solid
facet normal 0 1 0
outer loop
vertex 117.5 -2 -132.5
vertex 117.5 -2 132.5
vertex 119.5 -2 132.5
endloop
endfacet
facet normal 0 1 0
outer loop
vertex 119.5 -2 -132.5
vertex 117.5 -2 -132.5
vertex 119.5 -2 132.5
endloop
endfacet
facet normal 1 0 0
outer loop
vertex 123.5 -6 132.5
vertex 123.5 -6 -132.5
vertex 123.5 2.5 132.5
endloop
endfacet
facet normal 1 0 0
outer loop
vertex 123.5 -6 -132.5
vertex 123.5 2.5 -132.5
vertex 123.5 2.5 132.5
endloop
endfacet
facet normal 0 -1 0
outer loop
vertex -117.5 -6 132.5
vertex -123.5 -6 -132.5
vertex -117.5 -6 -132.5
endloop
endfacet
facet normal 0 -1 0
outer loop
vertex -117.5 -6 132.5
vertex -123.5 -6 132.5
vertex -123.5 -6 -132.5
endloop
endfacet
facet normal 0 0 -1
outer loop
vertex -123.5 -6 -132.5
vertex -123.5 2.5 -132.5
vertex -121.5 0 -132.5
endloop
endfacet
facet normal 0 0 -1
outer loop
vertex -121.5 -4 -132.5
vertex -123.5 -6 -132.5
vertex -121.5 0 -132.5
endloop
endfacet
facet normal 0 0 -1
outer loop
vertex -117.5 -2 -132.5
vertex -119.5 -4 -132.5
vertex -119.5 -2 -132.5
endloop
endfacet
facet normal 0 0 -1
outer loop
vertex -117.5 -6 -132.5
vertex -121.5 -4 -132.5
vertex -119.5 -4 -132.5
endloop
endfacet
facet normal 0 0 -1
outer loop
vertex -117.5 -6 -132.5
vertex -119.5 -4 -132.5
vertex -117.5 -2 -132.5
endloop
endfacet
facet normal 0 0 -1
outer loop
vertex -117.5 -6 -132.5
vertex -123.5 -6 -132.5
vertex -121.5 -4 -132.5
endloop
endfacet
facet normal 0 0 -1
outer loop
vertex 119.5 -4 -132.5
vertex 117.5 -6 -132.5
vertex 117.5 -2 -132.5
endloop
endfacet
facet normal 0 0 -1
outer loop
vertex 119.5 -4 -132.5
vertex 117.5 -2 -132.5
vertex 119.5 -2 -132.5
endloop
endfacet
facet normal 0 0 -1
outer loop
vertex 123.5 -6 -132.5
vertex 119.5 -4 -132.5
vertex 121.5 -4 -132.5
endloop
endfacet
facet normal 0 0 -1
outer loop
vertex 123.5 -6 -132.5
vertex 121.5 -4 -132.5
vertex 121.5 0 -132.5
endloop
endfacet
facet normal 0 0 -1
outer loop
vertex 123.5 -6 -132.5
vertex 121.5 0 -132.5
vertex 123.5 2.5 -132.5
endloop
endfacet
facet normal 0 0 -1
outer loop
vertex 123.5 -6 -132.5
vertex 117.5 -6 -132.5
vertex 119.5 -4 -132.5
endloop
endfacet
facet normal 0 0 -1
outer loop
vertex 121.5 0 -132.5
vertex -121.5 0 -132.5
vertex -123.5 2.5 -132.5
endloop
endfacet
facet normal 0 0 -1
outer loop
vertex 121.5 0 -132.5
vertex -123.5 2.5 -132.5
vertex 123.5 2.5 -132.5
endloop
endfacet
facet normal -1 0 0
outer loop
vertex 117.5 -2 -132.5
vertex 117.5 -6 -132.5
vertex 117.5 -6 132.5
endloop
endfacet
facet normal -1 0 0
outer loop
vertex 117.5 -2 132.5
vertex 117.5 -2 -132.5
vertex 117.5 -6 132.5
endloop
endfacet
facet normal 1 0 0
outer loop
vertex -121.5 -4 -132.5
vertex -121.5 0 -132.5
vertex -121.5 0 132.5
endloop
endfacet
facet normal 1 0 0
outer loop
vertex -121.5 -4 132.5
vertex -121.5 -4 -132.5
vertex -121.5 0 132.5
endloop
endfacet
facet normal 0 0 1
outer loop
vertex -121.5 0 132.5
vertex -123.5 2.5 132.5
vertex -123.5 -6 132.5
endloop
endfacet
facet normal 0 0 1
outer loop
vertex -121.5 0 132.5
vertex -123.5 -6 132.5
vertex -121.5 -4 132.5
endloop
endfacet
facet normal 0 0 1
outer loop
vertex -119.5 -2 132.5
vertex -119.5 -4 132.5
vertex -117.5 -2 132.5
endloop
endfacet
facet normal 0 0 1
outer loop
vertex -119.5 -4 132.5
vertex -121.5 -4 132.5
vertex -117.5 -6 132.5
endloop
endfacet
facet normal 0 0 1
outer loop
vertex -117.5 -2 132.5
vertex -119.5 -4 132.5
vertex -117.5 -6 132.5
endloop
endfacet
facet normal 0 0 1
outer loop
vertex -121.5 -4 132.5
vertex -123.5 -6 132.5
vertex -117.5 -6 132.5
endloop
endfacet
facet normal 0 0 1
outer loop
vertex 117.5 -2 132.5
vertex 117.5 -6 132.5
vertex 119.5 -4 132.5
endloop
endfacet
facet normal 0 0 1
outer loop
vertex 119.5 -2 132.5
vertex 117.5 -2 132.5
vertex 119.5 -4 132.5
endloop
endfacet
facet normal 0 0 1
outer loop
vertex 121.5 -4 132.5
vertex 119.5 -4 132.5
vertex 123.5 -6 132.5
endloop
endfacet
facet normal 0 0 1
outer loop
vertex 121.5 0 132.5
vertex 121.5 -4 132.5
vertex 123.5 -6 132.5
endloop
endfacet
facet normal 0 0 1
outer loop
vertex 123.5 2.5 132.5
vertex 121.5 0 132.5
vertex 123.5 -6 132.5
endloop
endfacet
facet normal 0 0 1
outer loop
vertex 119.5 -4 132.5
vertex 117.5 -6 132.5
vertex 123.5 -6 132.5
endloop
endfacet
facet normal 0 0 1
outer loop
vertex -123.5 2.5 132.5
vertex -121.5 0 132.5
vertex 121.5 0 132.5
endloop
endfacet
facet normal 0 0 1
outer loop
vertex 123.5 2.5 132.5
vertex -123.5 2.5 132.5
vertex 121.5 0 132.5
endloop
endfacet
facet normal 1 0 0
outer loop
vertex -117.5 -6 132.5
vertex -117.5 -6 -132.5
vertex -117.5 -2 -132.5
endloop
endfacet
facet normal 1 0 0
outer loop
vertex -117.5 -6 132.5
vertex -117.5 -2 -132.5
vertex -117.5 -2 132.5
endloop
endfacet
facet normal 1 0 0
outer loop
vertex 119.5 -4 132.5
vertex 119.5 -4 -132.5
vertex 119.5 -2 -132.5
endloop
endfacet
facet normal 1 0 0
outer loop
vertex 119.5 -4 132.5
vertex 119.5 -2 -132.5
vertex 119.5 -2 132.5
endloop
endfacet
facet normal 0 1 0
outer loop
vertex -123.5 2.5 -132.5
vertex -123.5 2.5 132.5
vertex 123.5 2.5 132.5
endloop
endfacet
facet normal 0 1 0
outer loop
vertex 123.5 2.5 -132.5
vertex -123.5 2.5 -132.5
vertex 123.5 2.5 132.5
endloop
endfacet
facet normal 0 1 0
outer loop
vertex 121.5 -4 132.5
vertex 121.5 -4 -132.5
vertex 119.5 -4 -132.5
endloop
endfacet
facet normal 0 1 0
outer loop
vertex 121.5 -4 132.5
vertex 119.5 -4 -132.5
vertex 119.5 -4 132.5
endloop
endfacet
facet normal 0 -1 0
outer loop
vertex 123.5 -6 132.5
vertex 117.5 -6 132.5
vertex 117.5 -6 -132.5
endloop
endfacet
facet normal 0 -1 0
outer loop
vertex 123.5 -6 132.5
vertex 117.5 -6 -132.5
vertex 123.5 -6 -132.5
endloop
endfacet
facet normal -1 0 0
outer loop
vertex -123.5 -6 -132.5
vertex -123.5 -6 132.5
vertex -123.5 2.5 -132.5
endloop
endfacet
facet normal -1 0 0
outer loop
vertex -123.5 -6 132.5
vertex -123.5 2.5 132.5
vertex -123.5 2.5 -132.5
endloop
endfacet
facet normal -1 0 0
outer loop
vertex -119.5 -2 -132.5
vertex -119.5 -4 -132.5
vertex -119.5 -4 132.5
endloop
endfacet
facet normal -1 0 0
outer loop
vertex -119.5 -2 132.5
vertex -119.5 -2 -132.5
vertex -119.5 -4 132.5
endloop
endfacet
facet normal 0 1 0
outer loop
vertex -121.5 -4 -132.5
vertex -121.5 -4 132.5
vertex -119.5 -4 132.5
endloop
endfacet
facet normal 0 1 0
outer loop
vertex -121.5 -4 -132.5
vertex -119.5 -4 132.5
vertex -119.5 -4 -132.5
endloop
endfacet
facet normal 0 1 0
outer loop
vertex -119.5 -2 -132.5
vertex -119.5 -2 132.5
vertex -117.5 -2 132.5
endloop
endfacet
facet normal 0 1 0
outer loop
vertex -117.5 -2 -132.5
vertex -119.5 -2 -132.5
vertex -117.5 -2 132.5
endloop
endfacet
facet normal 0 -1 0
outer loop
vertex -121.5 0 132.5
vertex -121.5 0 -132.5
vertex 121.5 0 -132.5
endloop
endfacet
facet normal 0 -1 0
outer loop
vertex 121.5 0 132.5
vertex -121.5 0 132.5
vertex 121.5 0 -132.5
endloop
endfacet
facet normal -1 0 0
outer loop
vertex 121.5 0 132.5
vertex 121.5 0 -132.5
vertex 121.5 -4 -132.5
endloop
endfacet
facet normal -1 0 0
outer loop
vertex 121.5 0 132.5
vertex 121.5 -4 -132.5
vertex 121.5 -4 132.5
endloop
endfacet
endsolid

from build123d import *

# Parameters (mm, degrees)
SKETCH2_W                = 243
SKETCH2_H                = 265
BOSS_EXTRUDE1_DEPTH      = 2.5
BOSS_EXTRUDE2_DEPTH      = 4
BOSS_EXTRUDE2_DEPTH_BACK = 2.5
SKETCH3_W                = 2
SKETCH3_H                = 265
BOSS_EXTRUDE3_DEPTH      = 4
BOSS_EXTRUDE3_DEPTH_BACK = 2.5
SKETCH4_W                = 2
SKETCH4_H                = 265
BOSS_EXTRUDE4_DEPTH      = 2
BOSS_EXTRUDE4_DEPTH_BACK = 2
SKETCH5_W                = 265
SKETCH5_H                = 2
BOSS_EXTRUDE5_DEPTH      = 2
BOSS_EXTRUDE5_DEPTH_BACK = 2
SKETCH6_W                = 265
SKETCH6_H                = 2
SKETCH7_W                = 2
SKETCH7_H                = 265
BOSS_EXTRUDE7_DEPTH      = 4
SKETCH8_W                = 2
SKETCH8_H                = 265
BOSS_EXTRUDE8_DEPTH      = 4


with BuildPart() as part:
    # Sketch2 → Boss-Extrude1 (new body)
    with BuildSketch(Plane(origin=(0, 0, 0), x_dir=(1, 0, 0), z_dir=(0, 1, 0))):
        Rectangle(SKETCH2_W, SKETCH2_H)
    extrude(amount=BOSS_EXTRUDE1_DEPTH)

    # Sketch3 → Boss-Extrude2 (add, two sides: drawn at the far end of the back side and taken through both)
    with BuildSketch(Plane.XZ.offset(-BOSS_EXTRUDE2_DEPTH_BACK)):
        with Locations((122.5, 0)):
            Rectangle(SKETCH3_W, SKETCH3_H)
    extrude(amount=BOSS_EXTRUDE2_DEPTH + BOSS_EXTRUDE2_DEPTH_BACK)

    # Sketch4 → Boss-Extrude3 (add, two sides: drawn at the far end of the back side and taken through both)
    with BuildSketch(Plane.XZ.offset(-BOSS_EXTRUDE3_DEPTH_BACK)):
        with Locations((-122.5, 0)):
            Rectangle(SKETCH4_W, SKETCH4_H)
    extrude(amount=BOSS_EXTRUDE3_DEPTH + BOSS_EXTRUDE3_DEPTH_BACK)

    # Sketch5 → Boss-Extrude4 (add, two sides: drawn at the far end of the back side and taken through both)
    with BuildSketch(Plane(origin=(-121.5, 0, 0), x_dir=(0, 0, -1), z_dir=(1, 0, 0)).offset(-BOSS_EXTRUDE4_DEPTH_BACK)):
        with Locations((0, -5)):
            Rectangle(SKETCH5_W, SKETCH5_H)
    extrude(amount=BOSS_EXTRUDE4_DEPTH + BOSS_EXTRUDE4_DEPTH_BACK)

    # Sketch6 → Boss-Extrude5 (add, two sides: drawn at the far end of the back side and taken through both)
    with BuildSketch(Plane.ZY.offset(-121.5).offset(-BOSS_EXTRUDE5_DEPTH_BACK)):
        with Locations((0, -5)):
            Rectangle(SKETCH6_W, SKETCH6_H)
    extrude(amount=BOSS_EXTRUDE5_DEPTH + BOSS_EXTRUDE5_DEPTH_BACK)

    # Sketch7 → Boss-Extrude7 (add)
    with BuildSketch(Plane.XZ.offset(6)):
        with Locations((118.5, 0)):
            Rectangle(SKETCH7_W, SKETCH7_H)
    extrude(amount=-BOSS_EXTRUDE7_DEPTH)

    # Sketch8 → Boss-Extrude8 (add)
    with BuildSketch(Plane.XZ.offset(6)):
        with Locations((-118.5, 0)):
            Rectangle(SKETCH8_W, SKETCH8_H)
    extrude(amount=-BOSS_EXTRUDE8_DEPTH)


solid = part.part
